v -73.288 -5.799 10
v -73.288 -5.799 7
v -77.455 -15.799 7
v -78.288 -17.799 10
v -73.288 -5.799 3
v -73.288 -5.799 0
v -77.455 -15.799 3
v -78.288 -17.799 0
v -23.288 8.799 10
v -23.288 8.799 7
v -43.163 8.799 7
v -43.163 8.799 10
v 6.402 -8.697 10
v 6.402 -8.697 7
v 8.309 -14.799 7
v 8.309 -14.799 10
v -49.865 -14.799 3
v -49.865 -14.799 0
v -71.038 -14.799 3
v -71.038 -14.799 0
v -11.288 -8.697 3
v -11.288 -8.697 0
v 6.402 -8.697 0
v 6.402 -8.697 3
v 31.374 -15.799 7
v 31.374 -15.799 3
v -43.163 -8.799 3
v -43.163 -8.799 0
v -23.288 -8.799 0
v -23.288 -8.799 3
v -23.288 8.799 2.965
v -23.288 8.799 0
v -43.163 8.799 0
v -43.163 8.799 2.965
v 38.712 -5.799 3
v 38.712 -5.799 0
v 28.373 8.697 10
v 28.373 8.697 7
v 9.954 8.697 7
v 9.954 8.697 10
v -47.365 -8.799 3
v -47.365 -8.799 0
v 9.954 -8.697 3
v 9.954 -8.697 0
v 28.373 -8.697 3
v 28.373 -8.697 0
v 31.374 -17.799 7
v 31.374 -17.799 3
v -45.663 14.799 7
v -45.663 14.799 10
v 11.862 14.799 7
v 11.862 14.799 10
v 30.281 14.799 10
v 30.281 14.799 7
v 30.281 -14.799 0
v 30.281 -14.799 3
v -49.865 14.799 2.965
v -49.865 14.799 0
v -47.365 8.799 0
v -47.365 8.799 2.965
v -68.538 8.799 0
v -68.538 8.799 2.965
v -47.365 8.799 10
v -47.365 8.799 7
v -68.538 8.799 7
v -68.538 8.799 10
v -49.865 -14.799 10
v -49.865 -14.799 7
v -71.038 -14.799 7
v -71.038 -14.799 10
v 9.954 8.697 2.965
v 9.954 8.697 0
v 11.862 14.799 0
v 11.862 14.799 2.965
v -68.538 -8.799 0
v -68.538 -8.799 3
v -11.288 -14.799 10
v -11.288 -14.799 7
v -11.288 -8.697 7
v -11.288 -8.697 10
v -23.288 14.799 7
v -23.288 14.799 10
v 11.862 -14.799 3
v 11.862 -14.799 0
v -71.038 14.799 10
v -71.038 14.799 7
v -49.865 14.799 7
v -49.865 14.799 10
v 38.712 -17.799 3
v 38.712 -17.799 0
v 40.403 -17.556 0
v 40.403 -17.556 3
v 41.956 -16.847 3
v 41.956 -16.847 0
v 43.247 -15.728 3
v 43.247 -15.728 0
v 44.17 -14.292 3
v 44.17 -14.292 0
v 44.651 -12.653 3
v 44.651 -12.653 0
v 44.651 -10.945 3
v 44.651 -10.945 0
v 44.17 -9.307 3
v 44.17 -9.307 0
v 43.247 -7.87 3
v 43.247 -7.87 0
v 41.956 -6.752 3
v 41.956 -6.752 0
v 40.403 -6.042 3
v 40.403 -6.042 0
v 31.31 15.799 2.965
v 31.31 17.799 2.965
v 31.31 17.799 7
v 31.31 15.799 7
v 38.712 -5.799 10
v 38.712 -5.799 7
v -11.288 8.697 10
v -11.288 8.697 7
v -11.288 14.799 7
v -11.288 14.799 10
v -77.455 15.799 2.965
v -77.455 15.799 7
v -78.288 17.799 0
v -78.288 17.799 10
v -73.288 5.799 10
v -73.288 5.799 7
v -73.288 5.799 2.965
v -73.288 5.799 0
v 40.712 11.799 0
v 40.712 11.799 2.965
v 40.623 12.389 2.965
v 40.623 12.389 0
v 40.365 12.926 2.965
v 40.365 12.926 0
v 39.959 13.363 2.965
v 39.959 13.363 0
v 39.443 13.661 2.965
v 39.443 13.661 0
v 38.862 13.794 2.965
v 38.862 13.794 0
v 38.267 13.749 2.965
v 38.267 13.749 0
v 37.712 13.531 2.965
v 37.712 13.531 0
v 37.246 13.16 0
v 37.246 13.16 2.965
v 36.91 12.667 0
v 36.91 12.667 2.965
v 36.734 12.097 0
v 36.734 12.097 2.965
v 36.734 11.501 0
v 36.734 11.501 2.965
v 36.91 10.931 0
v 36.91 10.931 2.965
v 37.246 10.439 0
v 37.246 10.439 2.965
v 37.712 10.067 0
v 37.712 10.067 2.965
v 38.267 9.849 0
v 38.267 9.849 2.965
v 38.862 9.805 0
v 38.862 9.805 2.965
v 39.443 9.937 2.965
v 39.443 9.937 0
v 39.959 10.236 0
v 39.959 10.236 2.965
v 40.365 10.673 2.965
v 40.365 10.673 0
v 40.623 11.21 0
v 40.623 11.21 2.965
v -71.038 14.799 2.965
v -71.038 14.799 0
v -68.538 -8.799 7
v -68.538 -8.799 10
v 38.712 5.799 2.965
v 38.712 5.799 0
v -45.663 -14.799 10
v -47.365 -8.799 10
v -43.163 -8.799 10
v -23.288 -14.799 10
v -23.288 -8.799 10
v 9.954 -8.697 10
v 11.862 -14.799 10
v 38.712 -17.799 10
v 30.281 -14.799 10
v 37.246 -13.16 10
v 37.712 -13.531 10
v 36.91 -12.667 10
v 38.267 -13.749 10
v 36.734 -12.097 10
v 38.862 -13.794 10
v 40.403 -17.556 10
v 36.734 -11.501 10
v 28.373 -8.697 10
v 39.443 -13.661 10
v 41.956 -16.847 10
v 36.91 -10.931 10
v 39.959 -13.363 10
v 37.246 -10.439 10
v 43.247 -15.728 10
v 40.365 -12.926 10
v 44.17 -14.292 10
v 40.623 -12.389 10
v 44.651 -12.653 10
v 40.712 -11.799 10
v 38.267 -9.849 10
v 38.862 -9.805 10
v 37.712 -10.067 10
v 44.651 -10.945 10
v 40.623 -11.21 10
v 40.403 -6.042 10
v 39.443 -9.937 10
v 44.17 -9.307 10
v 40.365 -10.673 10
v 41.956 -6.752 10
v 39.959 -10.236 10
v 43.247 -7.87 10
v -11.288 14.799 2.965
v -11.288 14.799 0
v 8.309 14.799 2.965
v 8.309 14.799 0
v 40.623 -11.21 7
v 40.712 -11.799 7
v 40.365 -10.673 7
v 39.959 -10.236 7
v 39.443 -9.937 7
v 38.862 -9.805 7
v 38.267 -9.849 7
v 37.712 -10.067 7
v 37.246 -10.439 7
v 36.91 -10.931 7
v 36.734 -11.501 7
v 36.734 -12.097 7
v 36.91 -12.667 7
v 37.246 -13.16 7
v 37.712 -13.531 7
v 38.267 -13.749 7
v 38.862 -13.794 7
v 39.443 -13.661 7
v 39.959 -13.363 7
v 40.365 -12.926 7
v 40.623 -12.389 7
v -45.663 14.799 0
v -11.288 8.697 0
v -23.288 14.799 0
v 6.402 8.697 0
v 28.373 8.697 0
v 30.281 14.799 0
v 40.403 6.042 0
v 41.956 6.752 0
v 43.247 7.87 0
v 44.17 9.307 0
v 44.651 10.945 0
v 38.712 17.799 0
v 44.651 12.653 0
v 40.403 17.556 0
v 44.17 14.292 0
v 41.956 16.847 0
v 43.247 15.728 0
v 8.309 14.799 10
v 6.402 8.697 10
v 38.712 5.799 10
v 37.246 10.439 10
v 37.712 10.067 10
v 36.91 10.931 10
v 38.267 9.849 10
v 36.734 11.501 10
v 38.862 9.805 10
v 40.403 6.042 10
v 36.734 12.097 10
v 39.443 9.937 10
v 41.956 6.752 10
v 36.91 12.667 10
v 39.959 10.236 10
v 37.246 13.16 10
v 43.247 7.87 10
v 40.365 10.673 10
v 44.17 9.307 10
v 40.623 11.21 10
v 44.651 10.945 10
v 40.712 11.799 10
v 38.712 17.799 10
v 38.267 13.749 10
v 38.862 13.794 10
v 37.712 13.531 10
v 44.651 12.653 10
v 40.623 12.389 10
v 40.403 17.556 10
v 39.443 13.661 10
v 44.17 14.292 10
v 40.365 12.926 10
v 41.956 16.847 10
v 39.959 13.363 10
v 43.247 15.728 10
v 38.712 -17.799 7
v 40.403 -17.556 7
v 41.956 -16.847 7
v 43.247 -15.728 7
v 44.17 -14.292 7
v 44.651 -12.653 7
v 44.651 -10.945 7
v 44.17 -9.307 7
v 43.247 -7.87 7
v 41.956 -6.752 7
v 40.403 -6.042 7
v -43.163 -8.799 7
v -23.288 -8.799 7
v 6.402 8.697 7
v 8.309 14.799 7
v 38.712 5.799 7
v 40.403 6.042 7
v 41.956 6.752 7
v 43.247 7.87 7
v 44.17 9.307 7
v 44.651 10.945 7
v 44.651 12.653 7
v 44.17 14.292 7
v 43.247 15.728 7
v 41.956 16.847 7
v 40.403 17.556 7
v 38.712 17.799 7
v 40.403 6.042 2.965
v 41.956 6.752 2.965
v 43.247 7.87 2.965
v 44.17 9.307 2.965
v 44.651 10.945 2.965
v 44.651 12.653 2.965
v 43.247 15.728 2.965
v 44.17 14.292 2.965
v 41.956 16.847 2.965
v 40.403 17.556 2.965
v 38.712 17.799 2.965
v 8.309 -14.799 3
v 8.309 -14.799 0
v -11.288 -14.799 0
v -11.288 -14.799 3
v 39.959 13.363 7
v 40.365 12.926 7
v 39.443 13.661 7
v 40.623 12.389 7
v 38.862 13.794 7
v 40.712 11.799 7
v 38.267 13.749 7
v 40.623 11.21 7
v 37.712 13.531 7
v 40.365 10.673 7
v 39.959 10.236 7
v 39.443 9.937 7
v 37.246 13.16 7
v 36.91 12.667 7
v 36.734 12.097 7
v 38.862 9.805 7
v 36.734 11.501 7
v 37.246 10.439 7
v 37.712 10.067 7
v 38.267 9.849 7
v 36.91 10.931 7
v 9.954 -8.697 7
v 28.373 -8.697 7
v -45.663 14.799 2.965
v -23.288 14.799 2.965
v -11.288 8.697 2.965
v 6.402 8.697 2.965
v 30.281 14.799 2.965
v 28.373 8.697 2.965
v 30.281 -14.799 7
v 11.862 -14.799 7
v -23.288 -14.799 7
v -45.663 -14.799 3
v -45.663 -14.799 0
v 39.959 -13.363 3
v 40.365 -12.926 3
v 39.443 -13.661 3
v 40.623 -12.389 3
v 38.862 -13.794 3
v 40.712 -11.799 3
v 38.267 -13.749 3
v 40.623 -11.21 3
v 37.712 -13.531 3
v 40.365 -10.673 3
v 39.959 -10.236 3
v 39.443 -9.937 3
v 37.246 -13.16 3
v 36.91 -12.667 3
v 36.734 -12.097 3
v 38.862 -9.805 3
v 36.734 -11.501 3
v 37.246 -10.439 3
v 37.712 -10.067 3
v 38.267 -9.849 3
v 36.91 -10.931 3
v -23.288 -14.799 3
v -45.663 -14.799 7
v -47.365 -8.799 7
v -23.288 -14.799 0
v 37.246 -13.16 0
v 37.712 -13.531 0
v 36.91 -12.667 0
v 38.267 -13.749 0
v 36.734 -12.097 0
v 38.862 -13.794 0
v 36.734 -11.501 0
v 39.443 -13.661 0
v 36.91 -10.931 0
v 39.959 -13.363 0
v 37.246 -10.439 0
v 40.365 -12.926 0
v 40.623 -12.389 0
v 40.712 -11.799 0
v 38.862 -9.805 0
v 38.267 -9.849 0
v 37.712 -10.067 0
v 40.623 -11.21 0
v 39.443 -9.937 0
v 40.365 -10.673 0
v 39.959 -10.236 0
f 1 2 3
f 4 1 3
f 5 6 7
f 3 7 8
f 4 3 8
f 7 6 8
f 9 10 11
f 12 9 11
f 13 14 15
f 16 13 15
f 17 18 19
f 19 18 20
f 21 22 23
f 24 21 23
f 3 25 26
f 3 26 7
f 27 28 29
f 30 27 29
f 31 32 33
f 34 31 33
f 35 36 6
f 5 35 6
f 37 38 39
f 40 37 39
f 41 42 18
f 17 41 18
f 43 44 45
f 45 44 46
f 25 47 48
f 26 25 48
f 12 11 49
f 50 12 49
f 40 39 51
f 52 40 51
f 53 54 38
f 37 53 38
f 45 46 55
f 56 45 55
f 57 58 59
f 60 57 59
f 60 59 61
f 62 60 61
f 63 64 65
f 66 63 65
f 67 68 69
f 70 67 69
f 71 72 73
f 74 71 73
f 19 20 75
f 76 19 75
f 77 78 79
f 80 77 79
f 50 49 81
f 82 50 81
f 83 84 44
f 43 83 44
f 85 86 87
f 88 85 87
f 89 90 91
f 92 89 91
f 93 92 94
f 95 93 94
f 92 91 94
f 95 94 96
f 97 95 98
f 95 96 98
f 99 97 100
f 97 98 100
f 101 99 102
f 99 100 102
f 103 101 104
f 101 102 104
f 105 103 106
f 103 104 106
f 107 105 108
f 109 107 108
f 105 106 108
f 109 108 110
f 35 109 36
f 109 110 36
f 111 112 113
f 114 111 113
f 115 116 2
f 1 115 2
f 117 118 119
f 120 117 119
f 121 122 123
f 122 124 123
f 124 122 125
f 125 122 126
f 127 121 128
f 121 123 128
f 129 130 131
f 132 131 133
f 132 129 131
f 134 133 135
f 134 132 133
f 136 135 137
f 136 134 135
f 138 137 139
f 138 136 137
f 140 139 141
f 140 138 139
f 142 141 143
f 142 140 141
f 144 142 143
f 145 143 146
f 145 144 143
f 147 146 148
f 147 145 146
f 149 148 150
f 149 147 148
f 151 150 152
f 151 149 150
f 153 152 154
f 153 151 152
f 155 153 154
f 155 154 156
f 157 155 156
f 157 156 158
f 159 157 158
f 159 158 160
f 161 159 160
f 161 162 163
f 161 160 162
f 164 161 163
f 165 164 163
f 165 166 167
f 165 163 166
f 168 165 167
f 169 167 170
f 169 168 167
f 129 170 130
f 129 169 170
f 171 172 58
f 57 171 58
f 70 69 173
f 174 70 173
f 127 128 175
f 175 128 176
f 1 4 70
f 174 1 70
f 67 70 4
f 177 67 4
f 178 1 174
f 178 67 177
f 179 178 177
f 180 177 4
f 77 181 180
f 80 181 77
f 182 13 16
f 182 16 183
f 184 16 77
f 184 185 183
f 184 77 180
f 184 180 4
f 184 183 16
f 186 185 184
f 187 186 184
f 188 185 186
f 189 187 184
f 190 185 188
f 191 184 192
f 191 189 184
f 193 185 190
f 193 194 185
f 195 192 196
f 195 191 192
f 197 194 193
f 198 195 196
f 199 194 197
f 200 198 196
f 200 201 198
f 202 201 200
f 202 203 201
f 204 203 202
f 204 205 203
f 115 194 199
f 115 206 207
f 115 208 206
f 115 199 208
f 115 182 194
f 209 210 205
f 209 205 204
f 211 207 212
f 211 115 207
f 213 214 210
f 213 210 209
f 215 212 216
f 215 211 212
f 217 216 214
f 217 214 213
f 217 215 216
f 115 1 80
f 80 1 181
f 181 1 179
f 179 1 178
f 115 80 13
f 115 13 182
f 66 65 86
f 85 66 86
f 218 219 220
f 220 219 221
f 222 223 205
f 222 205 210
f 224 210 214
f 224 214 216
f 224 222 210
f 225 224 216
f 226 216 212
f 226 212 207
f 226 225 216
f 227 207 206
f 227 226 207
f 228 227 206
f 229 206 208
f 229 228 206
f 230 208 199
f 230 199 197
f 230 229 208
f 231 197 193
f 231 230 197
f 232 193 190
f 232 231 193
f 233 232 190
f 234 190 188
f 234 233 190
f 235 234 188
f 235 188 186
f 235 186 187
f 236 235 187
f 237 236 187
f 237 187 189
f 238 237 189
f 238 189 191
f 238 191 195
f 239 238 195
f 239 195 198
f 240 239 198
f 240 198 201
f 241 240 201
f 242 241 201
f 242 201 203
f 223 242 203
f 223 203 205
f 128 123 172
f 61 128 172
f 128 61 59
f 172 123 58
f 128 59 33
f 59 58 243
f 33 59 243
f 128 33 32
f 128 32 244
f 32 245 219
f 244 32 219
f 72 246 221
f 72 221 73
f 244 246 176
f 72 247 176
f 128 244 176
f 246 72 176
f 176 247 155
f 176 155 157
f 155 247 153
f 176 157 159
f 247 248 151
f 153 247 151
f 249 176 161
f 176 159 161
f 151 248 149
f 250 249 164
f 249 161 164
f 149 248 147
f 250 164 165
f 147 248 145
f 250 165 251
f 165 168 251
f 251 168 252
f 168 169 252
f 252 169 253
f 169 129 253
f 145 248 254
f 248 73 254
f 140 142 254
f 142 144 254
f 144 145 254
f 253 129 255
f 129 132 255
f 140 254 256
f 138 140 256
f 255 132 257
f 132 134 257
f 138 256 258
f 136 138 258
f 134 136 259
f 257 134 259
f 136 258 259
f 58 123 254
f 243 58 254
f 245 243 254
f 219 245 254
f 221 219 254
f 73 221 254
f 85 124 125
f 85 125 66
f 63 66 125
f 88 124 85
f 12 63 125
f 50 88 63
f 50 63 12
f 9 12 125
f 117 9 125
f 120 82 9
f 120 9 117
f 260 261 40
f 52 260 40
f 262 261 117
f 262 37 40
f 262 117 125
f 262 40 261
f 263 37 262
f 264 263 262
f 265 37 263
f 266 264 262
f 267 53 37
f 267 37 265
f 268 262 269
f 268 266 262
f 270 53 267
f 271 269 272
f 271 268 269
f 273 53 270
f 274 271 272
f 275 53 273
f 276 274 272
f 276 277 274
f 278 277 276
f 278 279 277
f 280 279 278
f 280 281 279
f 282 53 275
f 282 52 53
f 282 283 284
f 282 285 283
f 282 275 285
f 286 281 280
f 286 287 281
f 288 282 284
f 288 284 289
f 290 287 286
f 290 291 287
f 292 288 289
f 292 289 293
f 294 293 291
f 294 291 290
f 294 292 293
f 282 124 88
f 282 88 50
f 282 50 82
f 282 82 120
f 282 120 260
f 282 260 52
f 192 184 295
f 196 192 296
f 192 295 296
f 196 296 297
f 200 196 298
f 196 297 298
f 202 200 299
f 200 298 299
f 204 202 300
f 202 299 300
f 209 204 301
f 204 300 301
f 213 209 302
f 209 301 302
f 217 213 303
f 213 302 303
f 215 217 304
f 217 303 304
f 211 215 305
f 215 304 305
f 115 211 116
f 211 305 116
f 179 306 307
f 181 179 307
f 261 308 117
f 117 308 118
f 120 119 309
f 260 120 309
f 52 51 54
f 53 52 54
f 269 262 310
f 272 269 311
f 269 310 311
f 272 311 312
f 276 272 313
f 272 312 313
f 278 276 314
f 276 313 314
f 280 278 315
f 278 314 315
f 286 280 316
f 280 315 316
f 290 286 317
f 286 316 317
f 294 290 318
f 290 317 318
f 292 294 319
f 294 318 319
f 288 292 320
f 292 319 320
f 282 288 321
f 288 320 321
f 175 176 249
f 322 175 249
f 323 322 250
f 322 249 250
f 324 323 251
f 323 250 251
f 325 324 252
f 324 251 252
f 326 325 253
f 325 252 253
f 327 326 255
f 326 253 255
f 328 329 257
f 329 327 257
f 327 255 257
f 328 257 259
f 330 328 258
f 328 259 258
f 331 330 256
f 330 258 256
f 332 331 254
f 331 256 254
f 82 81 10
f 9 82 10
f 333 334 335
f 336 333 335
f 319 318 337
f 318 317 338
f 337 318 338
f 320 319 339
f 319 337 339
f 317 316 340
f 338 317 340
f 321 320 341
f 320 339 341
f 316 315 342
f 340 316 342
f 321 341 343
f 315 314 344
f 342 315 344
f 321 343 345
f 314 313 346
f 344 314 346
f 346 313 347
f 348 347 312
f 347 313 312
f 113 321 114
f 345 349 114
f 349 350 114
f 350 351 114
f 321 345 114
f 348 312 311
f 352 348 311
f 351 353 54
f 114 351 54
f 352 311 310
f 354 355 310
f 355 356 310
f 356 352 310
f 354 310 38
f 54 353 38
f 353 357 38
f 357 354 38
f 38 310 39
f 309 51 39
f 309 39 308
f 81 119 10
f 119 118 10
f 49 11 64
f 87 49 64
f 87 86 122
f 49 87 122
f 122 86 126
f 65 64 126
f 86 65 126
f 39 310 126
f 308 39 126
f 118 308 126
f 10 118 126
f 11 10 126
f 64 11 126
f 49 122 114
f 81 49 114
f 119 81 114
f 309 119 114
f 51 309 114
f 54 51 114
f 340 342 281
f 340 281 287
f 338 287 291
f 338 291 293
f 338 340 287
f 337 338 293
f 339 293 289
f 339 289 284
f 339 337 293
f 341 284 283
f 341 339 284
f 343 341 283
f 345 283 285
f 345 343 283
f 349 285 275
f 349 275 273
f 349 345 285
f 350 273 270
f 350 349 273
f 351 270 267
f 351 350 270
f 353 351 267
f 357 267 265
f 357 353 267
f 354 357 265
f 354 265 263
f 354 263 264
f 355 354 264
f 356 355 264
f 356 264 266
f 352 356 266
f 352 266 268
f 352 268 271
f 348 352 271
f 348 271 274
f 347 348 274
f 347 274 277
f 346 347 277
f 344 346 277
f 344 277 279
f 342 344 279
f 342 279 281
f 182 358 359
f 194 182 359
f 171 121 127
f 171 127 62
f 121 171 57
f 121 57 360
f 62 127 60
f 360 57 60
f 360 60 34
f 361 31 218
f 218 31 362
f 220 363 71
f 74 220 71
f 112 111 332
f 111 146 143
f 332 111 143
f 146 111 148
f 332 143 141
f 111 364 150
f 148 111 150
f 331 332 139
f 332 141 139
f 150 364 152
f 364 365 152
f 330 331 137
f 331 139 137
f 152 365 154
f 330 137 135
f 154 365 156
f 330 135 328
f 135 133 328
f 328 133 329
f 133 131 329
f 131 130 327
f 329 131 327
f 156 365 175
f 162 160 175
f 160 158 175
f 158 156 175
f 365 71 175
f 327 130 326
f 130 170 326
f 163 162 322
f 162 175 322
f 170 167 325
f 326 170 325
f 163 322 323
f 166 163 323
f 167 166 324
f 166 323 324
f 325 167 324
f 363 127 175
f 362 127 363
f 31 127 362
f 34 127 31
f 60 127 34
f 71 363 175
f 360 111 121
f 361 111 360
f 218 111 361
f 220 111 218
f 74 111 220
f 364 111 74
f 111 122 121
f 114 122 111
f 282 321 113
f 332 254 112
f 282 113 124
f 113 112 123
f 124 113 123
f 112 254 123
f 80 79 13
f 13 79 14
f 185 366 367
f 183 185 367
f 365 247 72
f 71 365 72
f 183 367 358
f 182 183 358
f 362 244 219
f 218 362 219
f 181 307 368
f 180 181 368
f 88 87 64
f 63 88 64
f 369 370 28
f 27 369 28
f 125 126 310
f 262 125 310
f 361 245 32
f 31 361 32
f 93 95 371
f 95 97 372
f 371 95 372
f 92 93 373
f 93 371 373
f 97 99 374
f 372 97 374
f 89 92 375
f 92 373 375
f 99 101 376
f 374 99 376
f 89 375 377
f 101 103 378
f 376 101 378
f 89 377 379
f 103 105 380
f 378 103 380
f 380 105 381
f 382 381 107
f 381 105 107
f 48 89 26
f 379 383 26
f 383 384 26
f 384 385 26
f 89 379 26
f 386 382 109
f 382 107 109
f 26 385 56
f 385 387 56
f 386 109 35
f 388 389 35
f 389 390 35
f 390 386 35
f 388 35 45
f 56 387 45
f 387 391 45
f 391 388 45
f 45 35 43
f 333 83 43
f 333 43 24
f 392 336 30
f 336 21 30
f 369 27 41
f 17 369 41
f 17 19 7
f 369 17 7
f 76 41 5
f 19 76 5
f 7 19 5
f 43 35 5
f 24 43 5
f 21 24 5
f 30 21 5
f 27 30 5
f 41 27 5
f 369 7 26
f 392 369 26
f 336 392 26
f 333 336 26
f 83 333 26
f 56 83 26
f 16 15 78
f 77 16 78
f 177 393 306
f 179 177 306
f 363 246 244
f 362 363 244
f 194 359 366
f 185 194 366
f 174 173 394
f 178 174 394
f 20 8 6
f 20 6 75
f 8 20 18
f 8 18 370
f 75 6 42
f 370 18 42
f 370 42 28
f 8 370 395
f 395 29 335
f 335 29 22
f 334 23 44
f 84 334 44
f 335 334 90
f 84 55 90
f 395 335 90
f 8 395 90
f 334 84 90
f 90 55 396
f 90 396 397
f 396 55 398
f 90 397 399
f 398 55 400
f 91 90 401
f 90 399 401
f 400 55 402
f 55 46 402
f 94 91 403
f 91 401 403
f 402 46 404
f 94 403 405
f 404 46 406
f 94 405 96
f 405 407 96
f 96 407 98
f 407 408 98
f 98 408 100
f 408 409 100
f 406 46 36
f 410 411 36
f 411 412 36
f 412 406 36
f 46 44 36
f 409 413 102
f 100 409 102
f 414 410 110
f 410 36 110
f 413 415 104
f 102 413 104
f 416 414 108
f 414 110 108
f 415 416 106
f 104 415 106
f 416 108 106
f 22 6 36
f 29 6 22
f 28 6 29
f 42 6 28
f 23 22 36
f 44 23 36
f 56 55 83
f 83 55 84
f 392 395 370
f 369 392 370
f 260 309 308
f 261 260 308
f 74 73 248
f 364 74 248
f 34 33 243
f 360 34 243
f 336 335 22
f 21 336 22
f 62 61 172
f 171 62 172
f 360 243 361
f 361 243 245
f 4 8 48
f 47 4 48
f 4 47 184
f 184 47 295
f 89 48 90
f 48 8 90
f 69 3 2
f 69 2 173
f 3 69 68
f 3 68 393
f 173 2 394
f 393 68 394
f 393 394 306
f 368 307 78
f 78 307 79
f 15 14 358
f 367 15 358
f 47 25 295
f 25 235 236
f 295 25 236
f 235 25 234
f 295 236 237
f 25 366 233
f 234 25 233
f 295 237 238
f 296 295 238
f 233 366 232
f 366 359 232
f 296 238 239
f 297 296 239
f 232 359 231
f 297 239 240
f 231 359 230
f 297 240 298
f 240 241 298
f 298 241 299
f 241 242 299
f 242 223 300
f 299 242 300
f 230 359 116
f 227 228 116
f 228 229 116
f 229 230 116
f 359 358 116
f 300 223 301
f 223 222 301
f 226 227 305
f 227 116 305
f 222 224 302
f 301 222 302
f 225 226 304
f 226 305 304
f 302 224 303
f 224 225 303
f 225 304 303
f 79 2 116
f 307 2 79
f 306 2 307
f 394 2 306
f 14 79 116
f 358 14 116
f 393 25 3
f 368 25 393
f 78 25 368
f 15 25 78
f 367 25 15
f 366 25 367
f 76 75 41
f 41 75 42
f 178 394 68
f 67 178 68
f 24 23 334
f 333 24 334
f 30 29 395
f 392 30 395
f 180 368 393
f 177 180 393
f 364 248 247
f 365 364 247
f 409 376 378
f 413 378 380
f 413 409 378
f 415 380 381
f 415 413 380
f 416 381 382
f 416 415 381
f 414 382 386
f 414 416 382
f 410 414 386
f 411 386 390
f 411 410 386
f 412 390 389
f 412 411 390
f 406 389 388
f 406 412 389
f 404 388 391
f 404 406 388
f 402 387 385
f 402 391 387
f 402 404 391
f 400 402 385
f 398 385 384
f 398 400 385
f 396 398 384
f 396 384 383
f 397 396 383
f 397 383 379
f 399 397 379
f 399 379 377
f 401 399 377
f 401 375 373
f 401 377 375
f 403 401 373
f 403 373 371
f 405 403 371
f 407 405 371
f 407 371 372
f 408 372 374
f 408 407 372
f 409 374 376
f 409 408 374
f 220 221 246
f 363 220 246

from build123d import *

# Parameters (mm, degrees)
F0_R      = 2
F1_DEPTH  = 10
F2_W      = 10.1941861212
F2_H      = 4.0345681068
F3_DEPTH  = 10
F4_W      = 7.5655020773
F4_H      = 4
F5_DEPTH  = 5
F6_W      = 11.8742840528
F6_H      = 0.0345681068
F7_DEPTH  = 5
F8_W      = 22.0980979502
F8_H      = 4
F9_DEPTH  = 10
F10_W     = 8.841574192
F10_H     = 4
F11_DEPTH = 5


with BuildPart() as f1:
    # F0 (on Top) → F1 (new body)
    with BuildSketch(Plane.XY):
        with BuildLine():
            Line((-73.2878747284, 5.7992432788), (38.7121252716, 5.7992432788))
            ThreePointArc((38.7121252716, 5.7992432788), (44.7121252716, 11.7992432788), (38.7121252716, 17.7992432788))
            Line((38.7121252716, 17.7992432788), (-78.2878747284, 17.7992432788))
            Line((-78.2878747284, 17.7992432788), (-73.2878747284, 5.7992432788))
        make_face()
        Polygon((-47.3650060594, 8.7992432788), (-68.5378747284, 8.7992432788), (-71.0378747284, 14.7992432788), (-49.8650060594, 14.7992432788), align=None, mode=Mode.SUBTRACT)
        Polygon((-45.6628747284, 14.7992432788), (-23.2878747284, 14.7992432788), (-23.2878747284, 8.7992432788), (-43.1628747284, 8.7992432788), align=None, mode=Mode.SUBTRACT)
        Polygon((-11.2878747284, 8.6967073874), (-11.2878747284, 14.7992432788), (8.3094434813, 14.7992432788), (6.401501639, 8.6967073874), align=None, mode=Mode.SUBTRACT)
        Polygon((9.9537555186, 8.6967073874), (11.8616973609, 14.7992432788), (30.2808774263, 14.7992432788), (28.372935584, 8.6967073874), align=None, mode=Mode.SUBTRACT)
        with Locations((38.7121252716, 11.7992432788)):
            Circle(F0_R, mode=Mode.SUBTRACT)
    extrude(amount=F1_DEPTH)

    # F2 (on face) → F3 (cut)
    with BuildSketch(Plane.XZ.offset(-5.7992432788)):
        Polygon((-73.2878747284, 2.9654318932), (-73.2878747284, 7), (-77.6094347239, 7), (-78.6499679089, 7), (-78.6499679089, 2.9654318932), align=None)
        Polygon((38.7121252716, 7), (-70.0548663735, 7), (-73.2878747284, 7), (-73.2878747284, 2.9654318932), (-72.7878747284, 2.9654318932), (38.7121252716, 2.9654318932), align=None)
        with Locations((43.8092183322, 4.9827159466)):
            Rectangle(F2_W, F2_H)
    extrude(amount=-F3_DEPTH, mode=Mode.SUBTRACT)

    # F4 (on face) → F5 (cut)
    with BuildSketch(Plane(origin=(0, 17.7992432788, 0), x_dir=(-1, 0, 0), z_dir=(0, 1, 0))):
        with Locations((-42.4948763102, 5)):
            Rectangle(F4_W, F4_H)
        Polygon((-31.3099771738, 3), (-31.3099771738, 7), (-35.9585285187, 7), (-38.7121252716, 7), (-38.7121252716, 3), (-36.1494868994, 3), align=None)
    extrude(amount=-F5_DEPTH, mode=Mode.SUBTRACT)

    # F6 (on face) → F7 (cut)
    with BuildSketch(Plane.XZ.offset(-15.7992432788)):
        with Locations((37.2471192002, 2.9827159466)):
            Rectangle(F6_W, F6_H)
    extrude(amount=-F7_DEPTH, mode=Mode.SUBTRACT)


with BuildPart() as f1b:
    # F0 (on Top) → F1, piece 2 (new body)
    with BuildSketch(Plane.XY):
        with BuildLine():
            Line((-73.2878747284, -5.7992432788), (-78.2878747284, -17.7992432788))
            Line((-78.2878747284, -17.7992432788), (38.7121252716, -17.7992432788))
            ThreePointArc((38.7121252716, -17.7992432788), (44.7121252716, -11.7992432788), (38.7121252716, -5.7992432788))
            Line((38.7121252716, -5.7992432788), (-73.2878747284, -5.7992432788))
        make_face()
        Polygon((-47.3650060594, -8.7992432788), (-49.8650060594, -14.7992432788), (-71.0378747284, -14.7992432788), (-68.5378747284, -8.7992432788), align=None, mode=Mode.SUBTRACT)
        Polygon((-23.2878747284, -14.7992432788), (-45.6628747284, -14.7992432788), (-43.1628747284, -8.7992432788), (-23.2878747284, -8.7992432788), align=None, mode=Mode.SUBTRACT)
        Polygon((8.3094434813, -14.7992432788), (-11.2878747284, -14.7992432788), (-11.2878747284, -8.6967073874), (6.401501639, -8.6967073874), align=None, mode=Mode.SUBTRACT)
        Polygon((9.9537555186, -8.6967073874), (28.372935584, -8.6967073874), (30.2808774263, -14.7992432788), (11.8616973609, -14.7992432788), align=None, mode=Mode.SUBTRACT)
        with Locations((38.7121252716, -11.7992432788)):
            Circle(F0_R, mode=Mode.SUBTRACT)
    extrude(amount=F1_DEPTH)

    # F8 (on face) → F9 (cut)
    with BuildSketch(Plane(origin=(0, -5.7992432788, 0), x_dir=(-1, 0, 0), z_dir=(0, 1, 0))):
        Polygon((73.2878747284, 7), (-36.4116951823, 7), (-38.7121252716, 7), (-38.7121252716, 3), (-35.589389503, 3), (73.2878747284, 3), align=None)
        with Locations((-49.7611742467, 5)):
            Rectangle(F8_W, F8_H)
        Polygon((86.4499881864, 7), (73.2878747284, 7), (73.2878747284, 3), (86.6957977414, 3), align=None)
    extrude(amount=-F9_DEPTH, mode=Mode.SUBTRACT)

    # F10 (on face) → F11 (cut)
    with BuildSketch(Plane.XZ.offset(17.7992432788)):
        Polygon((34.7536914051, 3), (38.7121252716, 3), (38.7121252716, 7), (34.7536914051, 7), (31.3738286495, 7), (31.3738286495, 3), align=None)
        with Locations((43.1329123676, 5)):
            Rectangle(F10_W, F10_H)
    extrude(amount=-F11_DEPTH, mode=Mode.SUBTRACT)


solid = Compound([f1.part, f1b.part])
